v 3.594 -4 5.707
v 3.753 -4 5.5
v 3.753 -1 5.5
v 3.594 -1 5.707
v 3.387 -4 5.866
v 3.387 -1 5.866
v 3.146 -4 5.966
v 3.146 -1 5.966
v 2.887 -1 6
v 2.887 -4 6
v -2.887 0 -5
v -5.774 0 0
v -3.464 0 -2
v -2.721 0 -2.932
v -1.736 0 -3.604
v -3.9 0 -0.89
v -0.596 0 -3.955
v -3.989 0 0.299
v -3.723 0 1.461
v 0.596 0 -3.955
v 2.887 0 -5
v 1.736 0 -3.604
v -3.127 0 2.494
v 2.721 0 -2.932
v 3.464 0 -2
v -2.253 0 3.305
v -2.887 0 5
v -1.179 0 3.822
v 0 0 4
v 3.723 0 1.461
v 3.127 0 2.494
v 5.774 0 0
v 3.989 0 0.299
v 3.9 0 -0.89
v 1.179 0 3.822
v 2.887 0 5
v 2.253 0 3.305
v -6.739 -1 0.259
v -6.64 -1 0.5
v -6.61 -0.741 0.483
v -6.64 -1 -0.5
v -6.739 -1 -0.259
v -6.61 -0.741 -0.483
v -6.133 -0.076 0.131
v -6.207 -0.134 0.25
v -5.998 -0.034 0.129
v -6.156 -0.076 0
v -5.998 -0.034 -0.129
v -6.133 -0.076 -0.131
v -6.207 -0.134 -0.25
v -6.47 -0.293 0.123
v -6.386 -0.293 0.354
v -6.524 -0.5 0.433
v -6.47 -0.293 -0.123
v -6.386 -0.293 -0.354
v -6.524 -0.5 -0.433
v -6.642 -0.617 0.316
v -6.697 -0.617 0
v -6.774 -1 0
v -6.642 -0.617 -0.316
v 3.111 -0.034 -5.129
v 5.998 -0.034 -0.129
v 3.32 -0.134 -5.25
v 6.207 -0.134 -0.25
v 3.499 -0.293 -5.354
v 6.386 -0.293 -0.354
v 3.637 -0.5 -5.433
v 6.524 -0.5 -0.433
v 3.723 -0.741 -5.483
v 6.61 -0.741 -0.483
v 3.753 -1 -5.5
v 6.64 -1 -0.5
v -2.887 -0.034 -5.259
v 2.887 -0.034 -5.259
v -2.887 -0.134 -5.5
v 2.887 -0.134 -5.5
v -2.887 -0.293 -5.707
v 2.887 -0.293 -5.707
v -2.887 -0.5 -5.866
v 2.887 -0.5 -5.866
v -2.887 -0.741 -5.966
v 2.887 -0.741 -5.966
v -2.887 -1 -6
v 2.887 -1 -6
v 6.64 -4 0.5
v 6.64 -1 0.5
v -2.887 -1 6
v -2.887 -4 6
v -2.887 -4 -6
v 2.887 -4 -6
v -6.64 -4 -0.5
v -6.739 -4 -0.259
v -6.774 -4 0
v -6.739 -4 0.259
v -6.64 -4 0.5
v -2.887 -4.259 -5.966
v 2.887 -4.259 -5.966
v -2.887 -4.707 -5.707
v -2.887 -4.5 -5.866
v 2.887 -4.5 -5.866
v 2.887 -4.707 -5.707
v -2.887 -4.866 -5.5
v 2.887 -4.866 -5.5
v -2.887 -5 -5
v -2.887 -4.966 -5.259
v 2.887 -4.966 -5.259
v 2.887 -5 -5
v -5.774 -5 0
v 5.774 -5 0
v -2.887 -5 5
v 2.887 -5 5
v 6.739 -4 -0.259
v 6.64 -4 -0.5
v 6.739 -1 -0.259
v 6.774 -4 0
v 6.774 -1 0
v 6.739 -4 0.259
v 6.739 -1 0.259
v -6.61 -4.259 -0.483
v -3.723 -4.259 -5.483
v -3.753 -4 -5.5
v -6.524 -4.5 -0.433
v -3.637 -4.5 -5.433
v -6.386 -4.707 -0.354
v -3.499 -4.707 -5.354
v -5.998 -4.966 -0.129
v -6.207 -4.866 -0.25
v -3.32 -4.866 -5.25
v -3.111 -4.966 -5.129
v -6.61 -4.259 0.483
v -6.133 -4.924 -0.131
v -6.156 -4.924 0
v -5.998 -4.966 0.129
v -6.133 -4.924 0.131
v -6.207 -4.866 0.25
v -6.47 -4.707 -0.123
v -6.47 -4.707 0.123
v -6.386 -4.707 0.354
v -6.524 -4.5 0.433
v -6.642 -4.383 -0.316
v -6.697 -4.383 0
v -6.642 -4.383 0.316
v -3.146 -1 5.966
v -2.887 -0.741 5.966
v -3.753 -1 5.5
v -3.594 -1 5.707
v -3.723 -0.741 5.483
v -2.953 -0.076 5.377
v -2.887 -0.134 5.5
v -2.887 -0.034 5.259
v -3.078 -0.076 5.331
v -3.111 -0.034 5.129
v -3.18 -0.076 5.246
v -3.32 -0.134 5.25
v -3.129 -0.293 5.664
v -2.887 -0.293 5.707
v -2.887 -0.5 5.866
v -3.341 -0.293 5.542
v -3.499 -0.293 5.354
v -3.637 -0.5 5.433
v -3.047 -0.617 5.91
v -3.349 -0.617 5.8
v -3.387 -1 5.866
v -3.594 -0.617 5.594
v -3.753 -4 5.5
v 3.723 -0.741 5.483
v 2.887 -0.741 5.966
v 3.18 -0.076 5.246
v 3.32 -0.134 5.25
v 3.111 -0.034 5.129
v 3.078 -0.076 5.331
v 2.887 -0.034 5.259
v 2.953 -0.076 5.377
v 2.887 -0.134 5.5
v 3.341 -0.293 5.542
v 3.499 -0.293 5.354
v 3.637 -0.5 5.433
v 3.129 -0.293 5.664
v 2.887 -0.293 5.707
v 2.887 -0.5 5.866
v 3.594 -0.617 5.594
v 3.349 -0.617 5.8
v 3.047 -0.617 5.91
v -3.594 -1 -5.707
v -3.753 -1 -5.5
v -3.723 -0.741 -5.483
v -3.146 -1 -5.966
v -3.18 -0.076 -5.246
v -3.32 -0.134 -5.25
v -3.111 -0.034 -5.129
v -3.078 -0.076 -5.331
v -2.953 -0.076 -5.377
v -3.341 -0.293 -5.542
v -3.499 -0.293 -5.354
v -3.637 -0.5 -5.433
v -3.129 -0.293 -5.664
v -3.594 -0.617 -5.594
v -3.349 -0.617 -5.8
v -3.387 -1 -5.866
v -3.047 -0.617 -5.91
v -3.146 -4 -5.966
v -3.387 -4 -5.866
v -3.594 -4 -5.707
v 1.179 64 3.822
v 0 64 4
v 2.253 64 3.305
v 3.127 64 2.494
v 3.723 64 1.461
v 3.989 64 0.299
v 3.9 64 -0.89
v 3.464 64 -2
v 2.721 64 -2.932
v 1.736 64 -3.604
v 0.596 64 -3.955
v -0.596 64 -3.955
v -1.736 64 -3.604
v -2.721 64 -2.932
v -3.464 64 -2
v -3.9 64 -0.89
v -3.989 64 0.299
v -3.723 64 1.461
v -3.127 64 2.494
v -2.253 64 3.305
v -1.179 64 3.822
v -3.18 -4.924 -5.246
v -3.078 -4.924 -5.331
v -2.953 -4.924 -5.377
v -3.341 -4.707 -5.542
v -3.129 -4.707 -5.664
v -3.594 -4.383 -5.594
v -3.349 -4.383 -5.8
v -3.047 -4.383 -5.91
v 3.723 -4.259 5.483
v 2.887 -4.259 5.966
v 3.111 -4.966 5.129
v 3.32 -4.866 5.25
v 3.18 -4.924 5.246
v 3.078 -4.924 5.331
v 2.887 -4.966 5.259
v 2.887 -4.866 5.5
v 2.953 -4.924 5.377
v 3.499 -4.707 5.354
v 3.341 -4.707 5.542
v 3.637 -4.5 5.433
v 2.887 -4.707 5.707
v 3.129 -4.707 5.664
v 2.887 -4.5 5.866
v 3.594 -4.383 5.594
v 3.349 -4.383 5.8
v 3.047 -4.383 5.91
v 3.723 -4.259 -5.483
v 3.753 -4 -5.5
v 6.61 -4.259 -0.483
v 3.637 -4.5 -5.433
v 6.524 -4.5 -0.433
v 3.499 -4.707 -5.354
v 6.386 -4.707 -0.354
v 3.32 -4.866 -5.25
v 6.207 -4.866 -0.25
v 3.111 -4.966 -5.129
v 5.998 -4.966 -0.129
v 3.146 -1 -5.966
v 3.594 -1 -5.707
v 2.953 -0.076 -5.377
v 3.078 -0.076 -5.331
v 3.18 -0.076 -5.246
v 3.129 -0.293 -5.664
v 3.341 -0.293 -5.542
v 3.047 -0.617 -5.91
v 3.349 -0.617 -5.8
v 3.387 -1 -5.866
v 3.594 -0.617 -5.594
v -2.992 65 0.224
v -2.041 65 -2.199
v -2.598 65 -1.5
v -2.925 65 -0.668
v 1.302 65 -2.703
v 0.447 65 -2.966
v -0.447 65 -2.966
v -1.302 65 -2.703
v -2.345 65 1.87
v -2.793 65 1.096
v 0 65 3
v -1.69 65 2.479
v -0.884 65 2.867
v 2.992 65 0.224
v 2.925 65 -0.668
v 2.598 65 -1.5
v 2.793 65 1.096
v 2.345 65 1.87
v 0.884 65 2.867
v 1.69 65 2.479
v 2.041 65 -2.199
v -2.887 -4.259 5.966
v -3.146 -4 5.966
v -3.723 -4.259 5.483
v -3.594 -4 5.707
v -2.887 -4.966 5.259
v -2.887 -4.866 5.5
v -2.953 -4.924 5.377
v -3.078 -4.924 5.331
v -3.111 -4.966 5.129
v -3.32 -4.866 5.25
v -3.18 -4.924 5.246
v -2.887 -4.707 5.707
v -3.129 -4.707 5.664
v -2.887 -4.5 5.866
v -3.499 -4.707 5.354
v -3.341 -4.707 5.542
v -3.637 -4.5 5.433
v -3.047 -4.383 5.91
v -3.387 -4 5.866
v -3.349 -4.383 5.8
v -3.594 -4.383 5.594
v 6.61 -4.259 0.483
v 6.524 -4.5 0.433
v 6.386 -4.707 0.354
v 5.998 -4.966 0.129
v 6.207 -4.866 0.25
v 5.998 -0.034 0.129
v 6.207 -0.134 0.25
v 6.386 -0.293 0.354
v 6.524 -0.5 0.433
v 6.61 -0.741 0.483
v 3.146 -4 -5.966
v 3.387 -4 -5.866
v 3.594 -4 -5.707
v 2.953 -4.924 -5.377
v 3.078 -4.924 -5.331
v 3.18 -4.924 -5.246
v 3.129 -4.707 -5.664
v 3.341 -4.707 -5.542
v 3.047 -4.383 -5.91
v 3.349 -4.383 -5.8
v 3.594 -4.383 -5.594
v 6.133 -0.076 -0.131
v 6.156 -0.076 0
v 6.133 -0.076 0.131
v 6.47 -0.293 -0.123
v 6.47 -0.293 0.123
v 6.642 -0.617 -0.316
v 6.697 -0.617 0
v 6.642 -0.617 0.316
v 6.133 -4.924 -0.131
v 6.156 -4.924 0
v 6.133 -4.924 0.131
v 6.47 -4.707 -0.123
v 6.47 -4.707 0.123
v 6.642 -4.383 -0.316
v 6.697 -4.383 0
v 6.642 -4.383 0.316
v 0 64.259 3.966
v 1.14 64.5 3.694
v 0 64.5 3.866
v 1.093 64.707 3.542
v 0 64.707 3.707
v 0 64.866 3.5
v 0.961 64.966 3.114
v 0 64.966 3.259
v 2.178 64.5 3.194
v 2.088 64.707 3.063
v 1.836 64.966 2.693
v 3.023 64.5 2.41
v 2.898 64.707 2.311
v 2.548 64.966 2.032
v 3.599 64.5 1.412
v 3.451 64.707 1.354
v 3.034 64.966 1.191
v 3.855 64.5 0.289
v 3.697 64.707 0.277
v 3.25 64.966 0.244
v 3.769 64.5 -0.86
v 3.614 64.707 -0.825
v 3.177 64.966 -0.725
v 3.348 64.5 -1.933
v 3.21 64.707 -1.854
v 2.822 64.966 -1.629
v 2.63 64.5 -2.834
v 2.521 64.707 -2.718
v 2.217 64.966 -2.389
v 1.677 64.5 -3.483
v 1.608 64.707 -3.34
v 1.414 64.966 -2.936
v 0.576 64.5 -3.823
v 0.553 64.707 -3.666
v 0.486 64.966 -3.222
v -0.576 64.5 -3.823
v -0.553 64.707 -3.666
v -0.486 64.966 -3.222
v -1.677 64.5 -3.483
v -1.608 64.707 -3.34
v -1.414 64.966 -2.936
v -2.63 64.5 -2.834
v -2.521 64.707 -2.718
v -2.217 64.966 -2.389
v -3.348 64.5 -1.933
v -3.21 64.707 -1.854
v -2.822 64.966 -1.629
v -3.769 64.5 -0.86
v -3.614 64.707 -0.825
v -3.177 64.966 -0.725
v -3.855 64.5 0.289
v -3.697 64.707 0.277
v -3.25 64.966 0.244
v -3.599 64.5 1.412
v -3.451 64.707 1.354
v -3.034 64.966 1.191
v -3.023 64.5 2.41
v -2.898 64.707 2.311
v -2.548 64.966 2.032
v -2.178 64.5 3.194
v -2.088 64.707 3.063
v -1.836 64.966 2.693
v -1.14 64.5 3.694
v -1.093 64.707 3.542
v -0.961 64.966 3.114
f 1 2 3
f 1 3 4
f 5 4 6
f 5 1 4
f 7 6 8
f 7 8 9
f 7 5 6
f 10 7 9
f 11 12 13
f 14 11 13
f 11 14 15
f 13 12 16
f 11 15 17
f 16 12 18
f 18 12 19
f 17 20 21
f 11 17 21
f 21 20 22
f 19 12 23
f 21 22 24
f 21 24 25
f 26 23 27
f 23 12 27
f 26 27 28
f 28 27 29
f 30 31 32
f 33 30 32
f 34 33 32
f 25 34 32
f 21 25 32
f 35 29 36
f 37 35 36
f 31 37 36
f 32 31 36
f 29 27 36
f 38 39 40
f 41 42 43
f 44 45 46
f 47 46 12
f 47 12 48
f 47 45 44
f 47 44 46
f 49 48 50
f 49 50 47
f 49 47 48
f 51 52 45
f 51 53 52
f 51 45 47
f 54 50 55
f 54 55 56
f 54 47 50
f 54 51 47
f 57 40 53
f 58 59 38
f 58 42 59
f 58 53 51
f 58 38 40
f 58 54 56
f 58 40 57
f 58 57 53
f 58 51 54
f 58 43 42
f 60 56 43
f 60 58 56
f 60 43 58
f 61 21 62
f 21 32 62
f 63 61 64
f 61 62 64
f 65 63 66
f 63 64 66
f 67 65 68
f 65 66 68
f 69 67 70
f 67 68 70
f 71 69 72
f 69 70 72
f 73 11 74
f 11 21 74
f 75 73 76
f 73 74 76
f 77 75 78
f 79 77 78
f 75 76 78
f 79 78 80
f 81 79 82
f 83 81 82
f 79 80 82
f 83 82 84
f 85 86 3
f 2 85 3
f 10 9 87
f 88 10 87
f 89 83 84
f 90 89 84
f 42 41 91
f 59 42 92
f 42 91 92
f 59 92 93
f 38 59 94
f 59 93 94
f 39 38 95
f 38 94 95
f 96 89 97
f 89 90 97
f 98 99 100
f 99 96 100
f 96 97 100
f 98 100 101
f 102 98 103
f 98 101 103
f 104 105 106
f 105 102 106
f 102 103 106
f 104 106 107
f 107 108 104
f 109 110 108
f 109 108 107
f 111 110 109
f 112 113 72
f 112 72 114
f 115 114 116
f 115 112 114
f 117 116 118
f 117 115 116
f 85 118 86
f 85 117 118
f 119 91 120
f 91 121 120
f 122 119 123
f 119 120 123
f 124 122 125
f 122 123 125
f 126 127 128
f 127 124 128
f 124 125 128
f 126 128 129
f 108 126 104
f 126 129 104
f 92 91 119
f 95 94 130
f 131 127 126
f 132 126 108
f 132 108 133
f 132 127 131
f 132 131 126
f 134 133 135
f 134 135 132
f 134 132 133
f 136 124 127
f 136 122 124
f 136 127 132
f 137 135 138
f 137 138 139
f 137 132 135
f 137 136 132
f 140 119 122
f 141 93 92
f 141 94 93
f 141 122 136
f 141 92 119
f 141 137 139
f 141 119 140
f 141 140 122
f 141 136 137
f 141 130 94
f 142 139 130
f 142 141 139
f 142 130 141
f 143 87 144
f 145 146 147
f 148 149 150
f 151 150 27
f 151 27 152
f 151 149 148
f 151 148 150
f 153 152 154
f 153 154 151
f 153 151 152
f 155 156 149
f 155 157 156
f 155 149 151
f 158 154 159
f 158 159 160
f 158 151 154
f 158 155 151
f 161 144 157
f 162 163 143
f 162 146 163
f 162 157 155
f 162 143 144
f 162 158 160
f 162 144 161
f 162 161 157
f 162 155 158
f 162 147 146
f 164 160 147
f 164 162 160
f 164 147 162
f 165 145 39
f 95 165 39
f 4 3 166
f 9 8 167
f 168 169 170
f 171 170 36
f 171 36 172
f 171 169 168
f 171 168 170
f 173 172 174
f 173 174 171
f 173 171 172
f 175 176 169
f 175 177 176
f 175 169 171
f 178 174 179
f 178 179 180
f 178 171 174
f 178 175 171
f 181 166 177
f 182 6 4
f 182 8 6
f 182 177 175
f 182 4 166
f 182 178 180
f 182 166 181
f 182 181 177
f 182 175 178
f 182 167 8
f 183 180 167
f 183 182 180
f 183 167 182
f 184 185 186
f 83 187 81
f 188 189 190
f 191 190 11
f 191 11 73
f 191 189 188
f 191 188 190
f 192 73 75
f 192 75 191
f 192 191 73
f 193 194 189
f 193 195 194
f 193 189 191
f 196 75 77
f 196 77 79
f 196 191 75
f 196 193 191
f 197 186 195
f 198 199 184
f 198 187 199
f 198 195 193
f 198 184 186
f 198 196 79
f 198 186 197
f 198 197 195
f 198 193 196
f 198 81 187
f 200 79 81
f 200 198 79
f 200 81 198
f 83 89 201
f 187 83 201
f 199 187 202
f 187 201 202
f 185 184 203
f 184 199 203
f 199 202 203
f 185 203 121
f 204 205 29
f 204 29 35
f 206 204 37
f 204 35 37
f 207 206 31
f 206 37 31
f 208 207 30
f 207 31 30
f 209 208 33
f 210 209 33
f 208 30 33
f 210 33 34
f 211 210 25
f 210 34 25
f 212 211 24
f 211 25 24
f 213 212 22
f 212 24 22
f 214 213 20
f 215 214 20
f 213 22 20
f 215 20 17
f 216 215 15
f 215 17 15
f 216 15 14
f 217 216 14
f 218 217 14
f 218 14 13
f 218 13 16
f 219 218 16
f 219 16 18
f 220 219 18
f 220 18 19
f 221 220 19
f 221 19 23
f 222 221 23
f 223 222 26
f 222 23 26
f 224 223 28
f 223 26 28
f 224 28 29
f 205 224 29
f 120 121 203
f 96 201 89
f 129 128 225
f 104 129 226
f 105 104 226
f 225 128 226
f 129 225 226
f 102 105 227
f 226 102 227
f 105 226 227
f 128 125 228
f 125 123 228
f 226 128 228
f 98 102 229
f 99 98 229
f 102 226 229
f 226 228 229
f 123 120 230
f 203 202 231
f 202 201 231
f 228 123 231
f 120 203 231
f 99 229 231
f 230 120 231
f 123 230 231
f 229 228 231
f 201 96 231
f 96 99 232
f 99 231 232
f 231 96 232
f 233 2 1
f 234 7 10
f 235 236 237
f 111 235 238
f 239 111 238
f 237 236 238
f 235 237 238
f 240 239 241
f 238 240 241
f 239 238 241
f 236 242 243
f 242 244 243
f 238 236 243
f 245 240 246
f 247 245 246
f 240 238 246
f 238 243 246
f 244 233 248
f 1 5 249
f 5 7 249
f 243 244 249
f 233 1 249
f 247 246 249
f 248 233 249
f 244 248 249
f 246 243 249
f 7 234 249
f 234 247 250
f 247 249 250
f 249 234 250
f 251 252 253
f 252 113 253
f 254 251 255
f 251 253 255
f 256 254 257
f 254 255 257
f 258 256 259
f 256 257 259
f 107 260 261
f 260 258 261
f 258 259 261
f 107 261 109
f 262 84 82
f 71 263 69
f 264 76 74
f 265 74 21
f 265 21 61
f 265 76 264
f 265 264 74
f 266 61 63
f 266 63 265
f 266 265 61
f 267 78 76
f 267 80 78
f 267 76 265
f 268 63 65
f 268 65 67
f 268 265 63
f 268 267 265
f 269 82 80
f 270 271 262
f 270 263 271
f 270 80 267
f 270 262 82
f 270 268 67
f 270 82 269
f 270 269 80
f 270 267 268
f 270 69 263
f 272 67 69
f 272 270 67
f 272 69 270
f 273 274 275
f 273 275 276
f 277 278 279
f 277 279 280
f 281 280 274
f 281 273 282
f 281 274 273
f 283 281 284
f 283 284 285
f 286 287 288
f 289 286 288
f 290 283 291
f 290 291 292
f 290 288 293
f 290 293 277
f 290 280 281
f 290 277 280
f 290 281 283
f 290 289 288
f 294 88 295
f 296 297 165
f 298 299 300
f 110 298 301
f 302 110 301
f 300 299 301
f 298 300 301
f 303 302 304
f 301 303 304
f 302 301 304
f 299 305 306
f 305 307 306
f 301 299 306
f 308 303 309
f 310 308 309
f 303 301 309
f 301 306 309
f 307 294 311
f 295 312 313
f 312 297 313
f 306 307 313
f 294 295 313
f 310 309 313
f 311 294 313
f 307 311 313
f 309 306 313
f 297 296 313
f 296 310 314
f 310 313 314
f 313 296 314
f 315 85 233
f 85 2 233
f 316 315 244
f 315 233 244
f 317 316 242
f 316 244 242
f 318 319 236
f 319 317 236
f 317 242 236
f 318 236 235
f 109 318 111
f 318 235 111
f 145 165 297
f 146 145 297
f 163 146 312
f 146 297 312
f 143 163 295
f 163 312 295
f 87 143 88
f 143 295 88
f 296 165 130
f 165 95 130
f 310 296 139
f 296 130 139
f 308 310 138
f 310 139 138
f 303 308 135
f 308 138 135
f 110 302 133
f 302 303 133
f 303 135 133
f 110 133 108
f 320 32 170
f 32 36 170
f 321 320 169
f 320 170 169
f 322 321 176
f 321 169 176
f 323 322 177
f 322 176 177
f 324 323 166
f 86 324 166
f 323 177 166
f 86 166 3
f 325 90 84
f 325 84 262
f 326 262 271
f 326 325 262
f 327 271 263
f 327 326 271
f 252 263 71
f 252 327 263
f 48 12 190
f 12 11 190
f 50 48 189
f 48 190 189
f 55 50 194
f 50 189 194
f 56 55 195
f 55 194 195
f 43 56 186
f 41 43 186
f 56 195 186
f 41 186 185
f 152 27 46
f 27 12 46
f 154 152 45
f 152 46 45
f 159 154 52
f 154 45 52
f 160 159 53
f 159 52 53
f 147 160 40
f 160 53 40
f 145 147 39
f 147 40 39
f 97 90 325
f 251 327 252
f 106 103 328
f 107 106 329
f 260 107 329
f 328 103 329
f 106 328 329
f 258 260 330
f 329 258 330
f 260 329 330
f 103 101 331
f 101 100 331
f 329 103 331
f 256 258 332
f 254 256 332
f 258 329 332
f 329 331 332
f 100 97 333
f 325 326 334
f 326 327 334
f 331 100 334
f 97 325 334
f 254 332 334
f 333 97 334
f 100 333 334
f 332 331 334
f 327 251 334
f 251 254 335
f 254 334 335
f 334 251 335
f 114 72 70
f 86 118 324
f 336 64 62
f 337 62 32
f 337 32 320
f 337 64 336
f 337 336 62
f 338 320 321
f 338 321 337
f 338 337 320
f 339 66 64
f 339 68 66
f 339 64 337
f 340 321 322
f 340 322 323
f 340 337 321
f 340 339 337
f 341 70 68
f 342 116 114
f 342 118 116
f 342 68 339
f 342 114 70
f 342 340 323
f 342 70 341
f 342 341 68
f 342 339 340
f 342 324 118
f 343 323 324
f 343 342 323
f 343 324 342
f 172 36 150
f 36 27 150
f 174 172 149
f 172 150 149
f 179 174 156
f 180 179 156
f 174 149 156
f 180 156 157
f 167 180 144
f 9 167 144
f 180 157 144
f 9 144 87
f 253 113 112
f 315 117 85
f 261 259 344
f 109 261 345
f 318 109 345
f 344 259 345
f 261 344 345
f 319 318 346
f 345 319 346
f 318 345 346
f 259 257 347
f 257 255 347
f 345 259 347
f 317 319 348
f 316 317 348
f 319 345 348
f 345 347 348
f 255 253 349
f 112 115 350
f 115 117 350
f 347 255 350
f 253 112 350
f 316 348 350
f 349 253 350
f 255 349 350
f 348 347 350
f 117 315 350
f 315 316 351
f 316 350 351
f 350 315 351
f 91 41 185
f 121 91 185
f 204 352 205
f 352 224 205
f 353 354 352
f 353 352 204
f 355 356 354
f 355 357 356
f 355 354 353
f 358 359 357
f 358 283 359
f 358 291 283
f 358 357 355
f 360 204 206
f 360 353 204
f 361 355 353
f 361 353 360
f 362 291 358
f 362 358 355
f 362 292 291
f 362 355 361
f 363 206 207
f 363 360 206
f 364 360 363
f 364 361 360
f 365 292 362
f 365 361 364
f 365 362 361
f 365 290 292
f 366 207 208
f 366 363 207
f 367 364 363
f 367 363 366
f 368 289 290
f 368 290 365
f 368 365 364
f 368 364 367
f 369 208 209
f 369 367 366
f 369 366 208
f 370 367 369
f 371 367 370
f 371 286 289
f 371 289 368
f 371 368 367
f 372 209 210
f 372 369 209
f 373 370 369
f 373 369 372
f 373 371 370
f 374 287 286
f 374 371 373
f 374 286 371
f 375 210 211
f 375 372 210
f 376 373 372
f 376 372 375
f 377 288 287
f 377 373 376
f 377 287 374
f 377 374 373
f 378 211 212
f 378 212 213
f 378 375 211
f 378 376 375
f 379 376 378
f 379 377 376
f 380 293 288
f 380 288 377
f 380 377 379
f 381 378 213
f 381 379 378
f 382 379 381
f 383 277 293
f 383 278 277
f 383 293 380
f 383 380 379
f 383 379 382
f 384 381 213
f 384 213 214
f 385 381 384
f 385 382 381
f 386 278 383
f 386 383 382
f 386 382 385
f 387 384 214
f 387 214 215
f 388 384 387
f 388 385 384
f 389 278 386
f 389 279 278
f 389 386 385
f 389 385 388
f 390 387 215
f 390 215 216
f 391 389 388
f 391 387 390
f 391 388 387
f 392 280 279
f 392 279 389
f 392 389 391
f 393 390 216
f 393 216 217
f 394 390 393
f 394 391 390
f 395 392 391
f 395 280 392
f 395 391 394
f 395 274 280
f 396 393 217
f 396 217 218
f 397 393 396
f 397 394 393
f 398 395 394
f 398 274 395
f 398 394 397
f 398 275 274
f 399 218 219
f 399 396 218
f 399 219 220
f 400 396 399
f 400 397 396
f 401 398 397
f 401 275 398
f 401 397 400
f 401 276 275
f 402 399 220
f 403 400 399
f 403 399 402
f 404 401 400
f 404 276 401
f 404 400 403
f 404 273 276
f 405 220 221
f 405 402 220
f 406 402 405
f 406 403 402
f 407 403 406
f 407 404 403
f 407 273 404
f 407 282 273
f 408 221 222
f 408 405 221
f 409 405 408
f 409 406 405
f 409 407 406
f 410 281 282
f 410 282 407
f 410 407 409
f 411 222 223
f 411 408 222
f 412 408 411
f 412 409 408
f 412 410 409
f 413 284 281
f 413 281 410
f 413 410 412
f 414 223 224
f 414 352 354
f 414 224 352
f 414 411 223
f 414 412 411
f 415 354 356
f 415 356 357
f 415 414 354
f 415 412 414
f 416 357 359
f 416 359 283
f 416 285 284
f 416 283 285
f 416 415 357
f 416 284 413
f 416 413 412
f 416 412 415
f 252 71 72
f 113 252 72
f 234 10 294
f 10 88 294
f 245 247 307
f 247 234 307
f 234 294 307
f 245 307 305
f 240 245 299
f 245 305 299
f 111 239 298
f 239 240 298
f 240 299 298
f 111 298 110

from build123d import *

# Parameters (mm, degrees)
SKETCH1_R           = 4
BOSS_EXTRUDE1_DEPTH = 65
BOSS_EXTRUDE2_DEPTH = 5
FILLET1_R           = 1
FILLET2_R           = 1


with BuildPart() as part:
    # Sketch1 → Boss-Extrude1 (new body)
    with BuildSketch(Plane(origin=(0, 0, 0), x_dir=(1, 0, 0), z_dir=(0, 1, 0))):
        with Locations(Location((0, 0, 0), (0, 0, 270))):
            Circle(SKETCH1_R)
    extrude(amount=BOSS_EXTRUDE1_DEPTH)

    # Sketch2 → Boss-Extrude2 (add)
    with BuildSketch(Plane.XZ):
        Polygon((-3.464101615, -6), (3.464101615, -6), (6.92820323, 0), (3.464101615, 6), (-3.464101615, 6), (-6.92820323, 0), align=None)
    extrude(amount=BOSS_EXTRUDE2_DEPTH)

    # Fillet1
    fillet1_edges = [part.edges().sort_by_distance(p)[0] for p in [
        (0, 65, -4),
    ]]
    fillet(fillet1_edges, radius=FILLET1_R)

    # Fillet2
    fillet2_edges = [part.edges().sort_by_distance(p)[0] for p in [
        (-5.196152423, 0, -3),
        (-6.92820323, -2.5, 0),
        (0, 0, -6),
        (-3.464101615, -2.5, -6),
        (5.196152423, 0, -3),
        (3.464101615, -2.5, -6),
        (5.196152423, 0, 3),
        (6.92820323, -2.5, 0),
        (0, 0, 6),
        (3.464101615, -2.5, 6),
        (-5.196152423, 0, 3),
        (-3.464101615, -2.5, 6),
        (-5.196152423, -5, -3),
        (0, -5, -6),
        (5.196152423, -5, -3),
        (5.196152423, -5, 3),
        (0, -5, 6),
        (-5.196152423, -5, 3),
    ]]
    fillet(fillet2_edges, radius=FILLET2_R)


solid = part.part
